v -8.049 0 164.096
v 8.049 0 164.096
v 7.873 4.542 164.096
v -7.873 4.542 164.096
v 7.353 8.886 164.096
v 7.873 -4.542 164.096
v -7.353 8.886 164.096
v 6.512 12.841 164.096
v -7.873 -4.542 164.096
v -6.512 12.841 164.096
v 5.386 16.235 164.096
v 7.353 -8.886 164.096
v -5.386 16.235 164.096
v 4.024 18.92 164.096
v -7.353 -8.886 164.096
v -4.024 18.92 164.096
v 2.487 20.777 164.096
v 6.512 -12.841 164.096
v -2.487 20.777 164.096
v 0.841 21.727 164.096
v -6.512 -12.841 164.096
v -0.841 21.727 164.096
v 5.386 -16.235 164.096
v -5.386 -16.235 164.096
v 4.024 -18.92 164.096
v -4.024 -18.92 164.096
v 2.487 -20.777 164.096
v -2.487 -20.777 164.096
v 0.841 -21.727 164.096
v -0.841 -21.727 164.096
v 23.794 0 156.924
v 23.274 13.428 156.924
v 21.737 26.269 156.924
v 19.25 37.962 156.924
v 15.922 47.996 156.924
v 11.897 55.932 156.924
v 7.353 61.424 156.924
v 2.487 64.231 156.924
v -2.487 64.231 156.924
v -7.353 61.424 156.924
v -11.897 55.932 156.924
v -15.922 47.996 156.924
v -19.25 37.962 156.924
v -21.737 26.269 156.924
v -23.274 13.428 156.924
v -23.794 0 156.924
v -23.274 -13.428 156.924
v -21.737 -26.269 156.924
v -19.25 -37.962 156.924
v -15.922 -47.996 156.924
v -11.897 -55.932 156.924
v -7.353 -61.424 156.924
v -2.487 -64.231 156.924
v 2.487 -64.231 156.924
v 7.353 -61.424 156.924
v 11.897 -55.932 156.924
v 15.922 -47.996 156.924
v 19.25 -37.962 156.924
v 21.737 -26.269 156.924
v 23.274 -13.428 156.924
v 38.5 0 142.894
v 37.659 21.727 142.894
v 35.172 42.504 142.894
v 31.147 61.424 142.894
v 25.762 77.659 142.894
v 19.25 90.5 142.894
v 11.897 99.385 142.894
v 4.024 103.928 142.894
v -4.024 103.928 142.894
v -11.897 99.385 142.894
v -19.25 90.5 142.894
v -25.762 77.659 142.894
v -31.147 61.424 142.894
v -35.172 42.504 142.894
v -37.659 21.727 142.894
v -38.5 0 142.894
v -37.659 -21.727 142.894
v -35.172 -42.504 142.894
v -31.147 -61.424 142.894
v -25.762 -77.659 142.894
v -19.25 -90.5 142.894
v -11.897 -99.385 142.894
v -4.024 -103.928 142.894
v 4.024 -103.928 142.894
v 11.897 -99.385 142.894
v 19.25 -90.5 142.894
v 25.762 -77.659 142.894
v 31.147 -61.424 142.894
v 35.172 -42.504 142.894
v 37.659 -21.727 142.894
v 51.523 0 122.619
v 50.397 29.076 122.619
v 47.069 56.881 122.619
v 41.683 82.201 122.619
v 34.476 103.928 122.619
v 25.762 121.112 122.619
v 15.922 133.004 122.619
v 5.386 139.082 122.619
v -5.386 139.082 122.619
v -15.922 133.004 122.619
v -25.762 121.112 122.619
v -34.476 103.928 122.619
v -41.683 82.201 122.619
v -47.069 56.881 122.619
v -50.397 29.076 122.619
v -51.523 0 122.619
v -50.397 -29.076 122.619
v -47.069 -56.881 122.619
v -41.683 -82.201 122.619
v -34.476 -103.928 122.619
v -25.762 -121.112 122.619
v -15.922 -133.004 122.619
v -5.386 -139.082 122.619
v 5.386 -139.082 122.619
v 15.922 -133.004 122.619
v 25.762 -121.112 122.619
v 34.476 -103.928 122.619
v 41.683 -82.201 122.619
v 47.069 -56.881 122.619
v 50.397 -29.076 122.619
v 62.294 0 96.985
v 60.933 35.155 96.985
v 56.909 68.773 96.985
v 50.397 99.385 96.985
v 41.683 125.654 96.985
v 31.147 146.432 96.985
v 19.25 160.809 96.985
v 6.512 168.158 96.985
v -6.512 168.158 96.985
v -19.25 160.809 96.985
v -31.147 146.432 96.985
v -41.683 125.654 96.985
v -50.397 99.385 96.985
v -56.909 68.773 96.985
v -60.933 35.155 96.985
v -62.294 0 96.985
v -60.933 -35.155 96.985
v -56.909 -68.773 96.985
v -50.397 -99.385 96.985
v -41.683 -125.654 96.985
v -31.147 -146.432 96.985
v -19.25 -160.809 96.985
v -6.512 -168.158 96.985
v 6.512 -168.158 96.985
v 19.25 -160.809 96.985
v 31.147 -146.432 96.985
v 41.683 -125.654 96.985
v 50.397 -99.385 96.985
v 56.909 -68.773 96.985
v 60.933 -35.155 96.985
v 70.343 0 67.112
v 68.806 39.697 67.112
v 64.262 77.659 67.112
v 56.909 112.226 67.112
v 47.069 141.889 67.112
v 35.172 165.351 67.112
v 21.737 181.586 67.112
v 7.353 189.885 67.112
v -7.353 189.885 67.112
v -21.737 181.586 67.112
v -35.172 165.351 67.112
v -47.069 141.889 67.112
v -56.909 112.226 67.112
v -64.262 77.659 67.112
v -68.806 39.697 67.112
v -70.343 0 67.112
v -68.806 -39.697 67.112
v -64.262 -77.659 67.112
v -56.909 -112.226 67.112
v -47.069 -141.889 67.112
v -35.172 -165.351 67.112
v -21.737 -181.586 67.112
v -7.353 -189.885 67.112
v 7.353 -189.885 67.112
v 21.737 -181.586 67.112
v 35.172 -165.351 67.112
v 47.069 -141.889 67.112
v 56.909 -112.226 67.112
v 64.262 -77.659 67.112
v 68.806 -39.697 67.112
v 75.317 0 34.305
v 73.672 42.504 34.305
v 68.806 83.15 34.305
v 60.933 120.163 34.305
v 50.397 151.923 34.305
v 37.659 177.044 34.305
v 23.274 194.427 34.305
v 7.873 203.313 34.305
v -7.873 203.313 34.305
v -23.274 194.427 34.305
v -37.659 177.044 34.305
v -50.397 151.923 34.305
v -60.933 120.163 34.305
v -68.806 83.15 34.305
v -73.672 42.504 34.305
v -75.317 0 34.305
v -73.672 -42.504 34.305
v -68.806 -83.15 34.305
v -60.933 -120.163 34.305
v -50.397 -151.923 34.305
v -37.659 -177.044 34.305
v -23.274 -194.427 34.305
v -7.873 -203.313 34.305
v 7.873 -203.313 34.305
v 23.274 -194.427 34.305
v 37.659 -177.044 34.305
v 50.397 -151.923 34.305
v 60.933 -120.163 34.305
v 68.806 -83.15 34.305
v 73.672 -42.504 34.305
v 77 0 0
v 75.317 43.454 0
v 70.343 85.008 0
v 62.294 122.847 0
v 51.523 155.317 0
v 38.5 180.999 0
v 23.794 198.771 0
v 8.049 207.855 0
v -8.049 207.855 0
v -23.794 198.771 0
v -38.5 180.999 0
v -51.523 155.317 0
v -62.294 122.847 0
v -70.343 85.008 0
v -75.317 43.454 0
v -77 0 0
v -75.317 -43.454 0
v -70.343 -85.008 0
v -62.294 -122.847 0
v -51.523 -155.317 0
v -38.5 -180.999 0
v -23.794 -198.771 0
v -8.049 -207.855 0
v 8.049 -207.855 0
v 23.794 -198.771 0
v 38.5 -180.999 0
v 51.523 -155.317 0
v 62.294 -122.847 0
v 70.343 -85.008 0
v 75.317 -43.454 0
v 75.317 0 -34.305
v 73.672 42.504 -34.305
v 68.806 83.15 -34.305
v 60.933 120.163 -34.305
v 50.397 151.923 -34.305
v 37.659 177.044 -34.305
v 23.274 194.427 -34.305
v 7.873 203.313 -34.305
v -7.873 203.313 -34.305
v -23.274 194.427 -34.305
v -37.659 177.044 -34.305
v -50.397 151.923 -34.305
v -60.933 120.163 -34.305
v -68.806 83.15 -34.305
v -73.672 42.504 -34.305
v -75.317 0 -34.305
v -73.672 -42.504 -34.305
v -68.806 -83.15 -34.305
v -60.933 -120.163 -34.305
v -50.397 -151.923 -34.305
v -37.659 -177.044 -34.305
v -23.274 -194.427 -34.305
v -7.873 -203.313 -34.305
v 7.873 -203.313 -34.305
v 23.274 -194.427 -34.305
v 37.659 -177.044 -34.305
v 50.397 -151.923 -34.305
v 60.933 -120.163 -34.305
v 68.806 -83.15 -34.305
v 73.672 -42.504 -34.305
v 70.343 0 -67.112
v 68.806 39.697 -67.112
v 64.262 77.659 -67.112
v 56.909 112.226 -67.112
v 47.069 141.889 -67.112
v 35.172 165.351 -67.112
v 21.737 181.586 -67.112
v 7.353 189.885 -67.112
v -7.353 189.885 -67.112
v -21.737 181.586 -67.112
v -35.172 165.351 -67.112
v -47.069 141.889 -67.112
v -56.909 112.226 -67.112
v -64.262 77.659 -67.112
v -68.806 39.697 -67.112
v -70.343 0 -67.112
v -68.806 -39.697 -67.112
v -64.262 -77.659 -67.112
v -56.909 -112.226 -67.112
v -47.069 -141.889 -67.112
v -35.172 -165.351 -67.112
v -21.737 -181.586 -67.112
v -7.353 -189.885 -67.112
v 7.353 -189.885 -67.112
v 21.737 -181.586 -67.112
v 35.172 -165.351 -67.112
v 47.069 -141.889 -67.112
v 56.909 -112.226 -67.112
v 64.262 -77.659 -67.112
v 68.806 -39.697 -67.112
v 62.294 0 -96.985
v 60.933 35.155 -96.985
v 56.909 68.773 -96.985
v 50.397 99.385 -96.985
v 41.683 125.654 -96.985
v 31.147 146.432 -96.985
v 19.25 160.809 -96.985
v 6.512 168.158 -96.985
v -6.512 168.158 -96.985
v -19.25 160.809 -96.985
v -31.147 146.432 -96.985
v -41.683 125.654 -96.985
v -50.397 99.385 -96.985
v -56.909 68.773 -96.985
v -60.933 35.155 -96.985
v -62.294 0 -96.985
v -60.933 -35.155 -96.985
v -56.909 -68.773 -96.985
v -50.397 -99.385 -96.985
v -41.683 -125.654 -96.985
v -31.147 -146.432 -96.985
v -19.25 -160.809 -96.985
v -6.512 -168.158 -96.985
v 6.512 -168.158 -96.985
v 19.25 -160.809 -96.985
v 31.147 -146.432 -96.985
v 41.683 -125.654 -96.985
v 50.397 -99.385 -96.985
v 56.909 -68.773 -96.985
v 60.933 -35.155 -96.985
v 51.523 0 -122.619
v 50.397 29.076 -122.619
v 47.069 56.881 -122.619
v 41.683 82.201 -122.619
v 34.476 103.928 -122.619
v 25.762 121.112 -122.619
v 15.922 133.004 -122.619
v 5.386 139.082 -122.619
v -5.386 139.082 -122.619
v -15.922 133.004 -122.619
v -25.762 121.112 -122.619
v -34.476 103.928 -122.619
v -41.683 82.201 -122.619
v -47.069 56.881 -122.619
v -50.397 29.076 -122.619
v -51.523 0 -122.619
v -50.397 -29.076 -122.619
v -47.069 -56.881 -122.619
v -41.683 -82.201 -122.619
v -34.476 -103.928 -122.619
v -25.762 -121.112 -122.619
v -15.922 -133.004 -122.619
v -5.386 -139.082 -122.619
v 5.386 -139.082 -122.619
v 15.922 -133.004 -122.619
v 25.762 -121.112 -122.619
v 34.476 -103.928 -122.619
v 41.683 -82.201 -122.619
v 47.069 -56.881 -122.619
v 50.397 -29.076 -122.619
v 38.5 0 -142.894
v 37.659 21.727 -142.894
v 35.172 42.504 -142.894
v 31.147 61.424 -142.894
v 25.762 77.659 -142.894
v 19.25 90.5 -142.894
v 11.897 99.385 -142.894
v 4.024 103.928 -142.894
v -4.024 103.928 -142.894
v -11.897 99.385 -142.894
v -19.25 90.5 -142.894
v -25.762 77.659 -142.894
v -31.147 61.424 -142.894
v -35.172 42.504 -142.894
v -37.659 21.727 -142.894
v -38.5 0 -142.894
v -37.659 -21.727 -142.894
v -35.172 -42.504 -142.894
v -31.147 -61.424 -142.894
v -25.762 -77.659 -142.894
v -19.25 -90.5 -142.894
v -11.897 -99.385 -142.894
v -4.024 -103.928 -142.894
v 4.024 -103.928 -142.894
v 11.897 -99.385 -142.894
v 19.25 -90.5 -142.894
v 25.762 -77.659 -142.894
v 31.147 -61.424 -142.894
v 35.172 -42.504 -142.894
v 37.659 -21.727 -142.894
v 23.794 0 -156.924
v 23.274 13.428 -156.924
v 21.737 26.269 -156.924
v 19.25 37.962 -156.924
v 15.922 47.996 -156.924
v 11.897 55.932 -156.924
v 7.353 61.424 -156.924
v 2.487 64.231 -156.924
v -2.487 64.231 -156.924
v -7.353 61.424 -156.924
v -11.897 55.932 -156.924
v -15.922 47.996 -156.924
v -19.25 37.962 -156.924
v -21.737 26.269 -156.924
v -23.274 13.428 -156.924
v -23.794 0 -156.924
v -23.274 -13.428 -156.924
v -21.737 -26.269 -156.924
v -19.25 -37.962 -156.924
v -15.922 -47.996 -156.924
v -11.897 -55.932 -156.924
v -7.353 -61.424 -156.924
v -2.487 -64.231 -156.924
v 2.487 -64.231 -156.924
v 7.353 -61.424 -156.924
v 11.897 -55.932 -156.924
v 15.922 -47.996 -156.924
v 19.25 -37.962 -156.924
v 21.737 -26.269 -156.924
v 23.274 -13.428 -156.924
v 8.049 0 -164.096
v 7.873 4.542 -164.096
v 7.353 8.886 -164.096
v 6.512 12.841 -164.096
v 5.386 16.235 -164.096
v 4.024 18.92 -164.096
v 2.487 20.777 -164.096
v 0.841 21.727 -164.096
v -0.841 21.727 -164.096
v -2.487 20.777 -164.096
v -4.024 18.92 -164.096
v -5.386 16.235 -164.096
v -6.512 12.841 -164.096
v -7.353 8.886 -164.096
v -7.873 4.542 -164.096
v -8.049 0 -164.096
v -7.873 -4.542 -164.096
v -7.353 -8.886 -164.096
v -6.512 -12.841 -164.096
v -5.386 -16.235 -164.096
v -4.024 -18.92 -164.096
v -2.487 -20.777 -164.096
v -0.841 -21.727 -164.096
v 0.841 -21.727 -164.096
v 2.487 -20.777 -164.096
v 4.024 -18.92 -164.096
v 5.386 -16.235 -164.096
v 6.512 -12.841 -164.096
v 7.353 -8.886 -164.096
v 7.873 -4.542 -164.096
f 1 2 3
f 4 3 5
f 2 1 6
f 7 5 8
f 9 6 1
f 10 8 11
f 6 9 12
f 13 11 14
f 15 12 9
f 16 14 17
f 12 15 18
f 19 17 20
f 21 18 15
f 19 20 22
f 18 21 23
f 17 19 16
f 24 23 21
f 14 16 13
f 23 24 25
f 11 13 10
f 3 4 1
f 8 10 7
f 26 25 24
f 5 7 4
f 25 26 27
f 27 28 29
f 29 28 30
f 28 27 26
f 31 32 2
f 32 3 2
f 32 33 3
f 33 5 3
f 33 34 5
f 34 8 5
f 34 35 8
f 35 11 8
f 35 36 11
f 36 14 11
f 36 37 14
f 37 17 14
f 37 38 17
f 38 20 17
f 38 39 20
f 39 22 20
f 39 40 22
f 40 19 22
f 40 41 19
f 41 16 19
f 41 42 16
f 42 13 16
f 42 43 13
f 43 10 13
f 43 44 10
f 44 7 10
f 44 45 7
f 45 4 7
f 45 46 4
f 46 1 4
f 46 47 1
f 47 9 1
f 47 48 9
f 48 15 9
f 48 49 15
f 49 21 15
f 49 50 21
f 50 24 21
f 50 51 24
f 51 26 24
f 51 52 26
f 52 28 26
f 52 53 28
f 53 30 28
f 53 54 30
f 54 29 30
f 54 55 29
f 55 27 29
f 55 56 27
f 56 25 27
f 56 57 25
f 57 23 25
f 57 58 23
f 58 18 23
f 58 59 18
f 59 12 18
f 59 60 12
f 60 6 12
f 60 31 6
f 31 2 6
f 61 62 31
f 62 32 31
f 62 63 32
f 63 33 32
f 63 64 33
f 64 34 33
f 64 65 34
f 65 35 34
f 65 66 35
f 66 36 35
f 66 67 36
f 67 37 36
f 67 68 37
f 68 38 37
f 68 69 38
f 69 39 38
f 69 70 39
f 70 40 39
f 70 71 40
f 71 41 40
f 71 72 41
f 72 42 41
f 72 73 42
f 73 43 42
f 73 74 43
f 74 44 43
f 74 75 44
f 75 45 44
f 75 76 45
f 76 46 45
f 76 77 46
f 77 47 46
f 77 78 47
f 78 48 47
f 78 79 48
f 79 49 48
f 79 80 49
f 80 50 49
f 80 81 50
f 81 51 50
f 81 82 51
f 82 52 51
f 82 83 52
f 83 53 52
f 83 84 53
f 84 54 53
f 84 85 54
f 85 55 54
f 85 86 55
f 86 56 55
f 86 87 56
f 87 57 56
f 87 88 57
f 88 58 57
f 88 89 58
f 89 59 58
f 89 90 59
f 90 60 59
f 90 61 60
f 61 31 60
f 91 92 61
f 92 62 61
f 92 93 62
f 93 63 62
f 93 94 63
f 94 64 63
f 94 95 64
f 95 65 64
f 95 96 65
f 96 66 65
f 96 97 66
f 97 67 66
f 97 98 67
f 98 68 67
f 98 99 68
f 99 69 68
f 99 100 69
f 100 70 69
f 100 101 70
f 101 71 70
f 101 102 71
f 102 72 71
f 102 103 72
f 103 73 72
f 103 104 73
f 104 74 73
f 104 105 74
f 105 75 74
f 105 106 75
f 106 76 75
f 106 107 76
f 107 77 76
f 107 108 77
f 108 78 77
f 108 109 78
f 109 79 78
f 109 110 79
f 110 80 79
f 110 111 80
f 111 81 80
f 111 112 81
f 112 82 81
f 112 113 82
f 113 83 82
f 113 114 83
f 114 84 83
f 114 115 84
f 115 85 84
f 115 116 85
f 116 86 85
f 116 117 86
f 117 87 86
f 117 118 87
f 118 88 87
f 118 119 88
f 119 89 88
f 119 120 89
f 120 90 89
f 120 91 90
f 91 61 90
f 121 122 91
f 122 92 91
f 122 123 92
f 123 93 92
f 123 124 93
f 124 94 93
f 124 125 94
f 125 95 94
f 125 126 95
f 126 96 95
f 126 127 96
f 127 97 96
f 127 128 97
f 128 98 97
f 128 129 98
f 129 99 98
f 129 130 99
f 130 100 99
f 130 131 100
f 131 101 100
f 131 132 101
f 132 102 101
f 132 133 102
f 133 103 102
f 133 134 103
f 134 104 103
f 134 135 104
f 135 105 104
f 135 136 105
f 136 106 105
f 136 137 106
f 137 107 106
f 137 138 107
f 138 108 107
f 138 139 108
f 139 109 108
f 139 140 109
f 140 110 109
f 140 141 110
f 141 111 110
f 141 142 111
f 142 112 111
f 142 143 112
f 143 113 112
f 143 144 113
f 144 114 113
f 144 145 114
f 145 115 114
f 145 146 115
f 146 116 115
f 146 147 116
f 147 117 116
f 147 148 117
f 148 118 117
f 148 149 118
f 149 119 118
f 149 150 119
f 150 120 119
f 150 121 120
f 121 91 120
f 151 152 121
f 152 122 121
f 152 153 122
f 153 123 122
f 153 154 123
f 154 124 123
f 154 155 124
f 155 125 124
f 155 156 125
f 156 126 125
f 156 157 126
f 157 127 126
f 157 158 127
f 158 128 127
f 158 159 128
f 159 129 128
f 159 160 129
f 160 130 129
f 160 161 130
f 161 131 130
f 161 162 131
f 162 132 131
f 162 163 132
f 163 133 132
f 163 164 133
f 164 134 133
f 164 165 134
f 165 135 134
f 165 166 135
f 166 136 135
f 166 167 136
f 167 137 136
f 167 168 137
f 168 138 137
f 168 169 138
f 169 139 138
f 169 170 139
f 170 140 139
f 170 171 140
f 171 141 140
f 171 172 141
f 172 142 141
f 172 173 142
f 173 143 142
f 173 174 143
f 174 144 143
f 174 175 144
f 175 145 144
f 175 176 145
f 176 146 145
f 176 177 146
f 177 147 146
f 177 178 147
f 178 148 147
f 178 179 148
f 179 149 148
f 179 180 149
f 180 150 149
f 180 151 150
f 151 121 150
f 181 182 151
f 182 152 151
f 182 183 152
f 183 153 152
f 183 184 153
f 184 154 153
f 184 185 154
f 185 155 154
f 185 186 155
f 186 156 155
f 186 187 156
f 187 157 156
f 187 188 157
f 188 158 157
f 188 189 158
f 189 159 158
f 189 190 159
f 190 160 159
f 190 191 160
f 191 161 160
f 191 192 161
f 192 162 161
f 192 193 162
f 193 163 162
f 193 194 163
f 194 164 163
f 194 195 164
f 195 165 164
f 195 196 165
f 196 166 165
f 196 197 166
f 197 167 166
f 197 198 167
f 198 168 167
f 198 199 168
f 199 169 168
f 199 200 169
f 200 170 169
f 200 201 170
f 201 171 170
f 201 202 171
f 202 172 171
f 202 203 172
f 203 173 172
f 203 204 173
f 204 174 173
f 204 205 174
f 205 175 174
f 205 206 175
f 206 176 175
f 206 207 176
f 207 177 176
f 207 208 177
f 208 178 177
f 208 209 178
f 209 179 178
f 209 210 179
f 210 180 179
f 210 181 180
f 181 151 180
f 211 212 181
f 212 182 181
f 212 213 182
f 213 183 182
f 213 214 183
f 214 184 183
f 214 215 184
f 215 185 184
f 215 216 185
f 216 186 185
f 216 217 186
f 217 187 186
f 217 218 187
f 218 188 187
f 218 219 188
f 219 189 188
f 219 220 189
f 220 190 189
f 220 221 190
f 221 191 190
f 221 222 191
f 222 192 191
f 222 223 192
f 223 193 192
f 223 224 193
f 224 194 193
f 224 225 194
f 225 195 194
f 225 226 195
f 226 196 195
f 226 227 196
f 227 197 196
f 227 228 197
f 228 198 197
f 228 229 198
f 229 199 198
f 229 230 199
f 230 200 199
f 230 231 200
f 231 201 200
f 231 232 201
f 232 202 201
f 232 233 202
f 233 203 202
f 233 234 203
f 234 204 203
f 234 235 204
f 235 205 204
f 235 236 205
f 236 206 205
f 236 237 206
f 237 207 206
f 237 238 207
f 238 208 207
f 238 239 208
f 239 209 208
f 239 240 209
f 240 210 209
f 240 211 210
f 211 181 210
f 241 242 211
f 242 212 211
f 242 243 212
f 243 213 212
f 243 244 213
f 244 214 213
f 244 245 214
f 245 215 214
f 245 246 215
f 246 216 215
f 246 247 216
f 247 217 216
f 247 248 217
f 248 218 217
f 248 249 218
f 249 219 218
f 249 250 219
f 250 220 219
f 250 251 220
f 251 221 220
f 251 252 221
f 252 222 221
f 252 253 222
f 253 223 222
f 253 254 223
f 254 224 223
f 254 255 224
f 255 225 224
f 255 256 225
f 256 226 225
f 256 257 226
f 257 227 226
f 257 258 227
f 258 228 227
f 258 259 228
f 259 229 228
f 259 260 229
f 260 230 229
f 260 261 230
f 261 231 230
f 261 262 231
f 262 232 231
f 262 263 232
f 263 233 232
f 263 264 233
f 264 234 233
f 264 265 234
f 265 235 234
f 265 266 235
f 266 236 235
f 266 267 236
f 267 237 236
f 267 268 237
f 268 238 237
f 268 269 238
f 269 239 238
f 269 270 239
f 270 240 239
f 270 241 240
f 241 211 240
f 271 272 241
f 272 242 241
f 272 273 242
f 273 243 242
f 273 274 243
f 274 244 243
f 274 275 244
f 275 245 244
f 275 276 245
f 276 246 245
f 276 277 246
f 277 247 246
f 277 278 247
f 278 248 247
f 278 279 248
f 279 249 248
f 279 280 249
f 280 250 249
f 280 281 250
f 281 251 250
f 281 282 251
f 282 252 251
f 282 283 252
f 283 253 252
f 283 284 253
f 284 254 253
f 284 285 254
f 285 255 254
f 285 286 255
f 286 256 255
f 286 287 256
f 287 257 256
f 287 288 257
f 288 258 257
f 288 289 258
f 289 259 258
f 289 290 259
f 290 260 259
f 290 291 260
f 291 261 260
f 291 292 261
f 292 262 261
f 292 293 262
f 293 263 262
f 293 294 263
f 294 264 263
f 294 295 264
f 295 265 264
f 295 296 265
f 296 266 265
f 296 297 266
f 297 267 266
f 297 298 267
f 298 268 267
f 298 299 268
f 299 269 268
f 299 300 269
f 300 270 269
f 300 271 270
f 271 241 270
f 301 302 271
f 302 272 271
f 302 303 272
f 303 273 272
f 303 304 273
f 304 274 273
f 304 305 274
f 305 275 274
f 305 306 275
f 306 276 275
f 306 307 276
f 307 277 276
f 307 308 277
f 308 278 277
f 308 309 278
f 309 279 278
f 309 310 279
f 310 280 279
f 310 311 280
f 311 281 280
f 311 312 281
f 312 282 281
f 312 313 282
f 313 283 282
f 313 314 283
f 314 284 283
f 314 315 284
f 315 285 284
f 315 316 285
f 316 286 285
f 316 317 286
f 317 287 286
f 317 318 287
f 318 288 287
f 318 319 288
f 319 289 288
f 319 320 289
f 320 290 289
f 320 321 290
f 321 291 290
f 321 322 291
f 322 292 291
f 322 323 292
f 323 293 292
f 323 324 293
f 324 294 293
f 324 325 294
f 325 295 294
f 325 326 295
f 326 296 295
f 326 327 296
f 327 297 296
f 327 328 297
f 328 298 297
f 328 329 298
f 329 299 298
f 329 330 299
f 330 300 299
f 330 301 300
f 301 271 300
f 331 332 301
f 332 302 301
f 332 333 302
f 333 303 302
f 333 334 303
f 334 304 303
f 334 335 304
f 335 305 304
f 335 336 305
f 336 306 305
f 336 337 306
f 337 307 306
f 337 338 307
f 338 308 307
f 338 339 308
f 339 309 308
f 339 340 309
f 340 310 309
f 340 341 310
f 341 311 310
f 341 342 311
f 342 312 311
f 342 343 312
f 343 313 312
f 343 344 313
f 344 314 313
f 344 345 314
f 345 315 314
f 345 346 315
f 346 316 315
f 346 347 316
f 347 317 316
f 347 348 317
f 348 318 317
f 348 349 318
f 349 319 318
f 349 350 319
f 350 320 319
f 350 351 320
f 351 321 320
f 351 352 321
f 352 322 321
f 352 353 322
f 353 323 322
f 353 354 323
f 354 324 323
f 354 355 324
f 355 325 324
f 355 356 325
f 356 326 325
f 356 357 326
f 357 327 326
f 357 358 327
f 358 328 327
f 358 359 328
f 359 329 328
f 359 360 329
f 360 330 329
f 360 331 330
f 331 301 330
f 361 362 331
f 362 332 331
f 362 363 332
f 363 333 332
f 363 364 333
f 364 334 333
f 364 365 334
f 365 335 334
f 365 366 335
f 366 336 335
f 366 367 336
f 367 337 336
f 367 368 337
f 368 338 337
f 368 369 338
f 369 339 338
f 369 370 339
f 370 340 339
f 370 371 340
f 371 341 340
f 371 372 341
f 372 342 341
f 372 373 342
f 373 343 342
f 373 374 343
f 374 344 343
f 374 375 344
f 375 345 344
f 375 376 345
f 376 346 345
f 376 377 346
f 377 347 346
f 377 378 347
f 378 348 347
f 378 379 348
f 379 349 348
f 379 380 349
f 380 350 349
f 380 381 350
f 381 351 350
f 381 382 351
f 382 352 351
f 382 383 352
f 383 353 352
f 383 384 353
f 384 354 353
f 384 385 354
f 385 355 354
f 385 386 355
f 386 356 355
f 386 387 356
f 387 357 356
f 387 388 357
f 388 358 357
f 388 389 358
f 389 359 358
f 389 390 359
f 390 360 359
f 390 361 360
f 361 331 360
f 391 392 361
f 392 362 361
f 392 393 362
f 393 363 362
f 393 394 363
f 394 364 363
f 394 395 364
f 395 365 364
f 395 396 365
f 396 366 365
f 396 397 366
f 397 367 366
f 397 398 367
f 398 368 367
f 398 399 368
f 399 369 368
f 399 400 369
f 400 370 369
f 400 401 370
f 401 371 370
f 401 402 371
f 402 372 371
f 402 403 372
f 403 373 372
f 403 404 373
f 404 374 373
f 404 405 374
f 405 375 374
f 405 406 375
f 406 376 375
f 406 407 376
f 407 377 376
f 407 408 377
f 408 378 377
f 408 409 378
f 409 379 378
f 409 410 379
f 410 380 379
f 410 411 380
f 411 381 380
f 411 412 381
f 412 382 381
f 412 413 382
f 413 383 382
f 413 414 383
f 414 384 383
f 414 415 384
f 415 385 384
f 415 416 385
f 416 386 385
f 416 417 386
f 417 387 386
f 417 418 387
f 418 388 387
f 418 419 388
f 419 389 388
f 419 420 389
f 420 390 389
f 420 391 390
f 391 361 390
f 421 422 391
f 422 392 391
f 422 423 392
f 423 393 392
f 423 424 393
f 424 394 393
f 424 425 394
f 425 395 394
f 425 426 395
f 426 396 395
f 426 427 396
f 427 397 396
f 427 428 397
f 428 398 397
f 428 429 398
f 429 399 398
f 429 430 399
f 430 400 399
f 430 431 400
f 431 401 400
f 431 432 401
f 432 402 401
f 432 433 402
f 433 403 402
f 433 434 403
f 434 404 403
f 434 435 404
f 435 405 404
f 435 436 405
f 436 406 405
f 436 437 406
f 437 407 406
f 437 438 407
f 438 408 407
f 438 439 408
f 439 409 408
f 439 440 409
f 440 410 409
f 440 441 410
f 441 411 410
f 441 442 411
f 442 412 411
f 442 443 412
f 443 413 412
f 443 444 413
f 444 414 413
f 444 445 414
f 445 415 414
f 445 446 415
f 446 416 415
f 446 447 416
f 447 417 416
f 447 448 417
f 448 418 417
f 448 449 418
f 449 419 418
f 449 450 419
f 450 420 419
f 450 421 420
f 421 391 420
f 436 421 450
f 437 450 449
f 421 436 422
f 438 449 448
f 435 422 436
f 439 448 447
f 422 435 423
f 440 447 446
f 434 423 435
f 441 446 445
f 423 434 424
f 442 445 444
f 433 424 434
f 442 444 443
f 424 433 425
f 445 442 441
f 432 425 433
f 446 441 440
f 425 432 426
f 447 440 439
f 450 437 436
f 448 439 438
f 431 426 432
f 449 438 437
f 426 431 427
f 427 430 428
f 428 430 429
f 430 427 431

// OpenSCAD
// Generated by SolidPython 1.0.1 on 2020-07-29 00:46:48


scale(v = [7, 19, 15]) {
	sphere(r = 11);
}
/***********************************************
*********      SolidPython code:      **********
************************************************
 
# import packages: SolidPython
from solid import *
from solid.utils import *
from itertools import chain, combinations, permutations


class Resize:

    def __init__(self, scad_file):
        self.scad_file = scad_file
        #self.scad_file = import_scad(scad_file)
        # cone/cylinder param:
        self.r1 = 0
        self.r2 = 0
        self.h = 0
        # rectangular prism param:
        self.w = 0
        self.l = 0
        # ellipse param:
        self.r = 0

    # import OpenScad code (file name corresponds to shape)


    # classify shape + parameters
    def assign(self, param1, param2, param3):
        if self.scad_file == 'cone.scad':
            self.r1 = param1
            self.r2 = param2
            self.h = param3
        elif self.scad_file == 'cylinder.scad':
            self.r1 = param1
            self.r2 = param2
            self.h = param3
        elif self.scad_file == 'rectangularPrism.scad':
            self.h = param1
            self.l = param2
            self.w = param3
        else:
            self.r = param1
            self.h = param2

    # resize parameters
    def iterate(self):
        x = range(3, 20, 2)
        i = 1
        if self.scad_file == 'cone.scad':
            tempList = list(permutations(x, 2))
            for temp in tempList:
                param1 = temp[0]
                param2 = temp[1]
                filepath = 'produced_scad_files/' + 'cone' + str(param1) + '_' + str(param2) + '_' + '.scad'
                scad_render_to_file(cylinder(h=param1, r1=param2, r2=0), filepath)

        elif self.scad_file == 'cylinder.scad':
            tempList = list(permutations(x, 3))
            for temp in tempList:
                param1 = temp[0]
                param2 = temp[1]
                filepath = 'produced_scad_files/' + 'cylinder' + str(param1) + '_' + str(param2) + '_' + '.scad'
                scad_render_to_file(cylinder(h=param1, r1=param2, r2=param2), filepath)

        elif self.scad_file == 'rectangularPrism.scad':
            tempList = list(permutations(x, 3))
            for temp in tempList:
                param1 = temp[0]
                param2 = temp[1]
                param3 = temp[2]
                filepath = 'produced_scad_files/' + 'rectangularPrism' + str(param1) + '_' + str(param2) + '_' + str(
                    param3) + '.scad'
                scad_render_to_file(cube(size=(param1, param2, param3)), filepath)

        elif self.scad_file == 'ellipse.scad':
            tempList = list(permutations(x, 4))
            for temp in tempList:
                param1 = temp[0]
                param2 = temp[1]
                param3 = temp[2]
                param4 = temp[3]
                filepath = 'produced_scad_files/' + 'ellipse' + str(param1) + '_' + str(param2) + '_' + str(param3) + '_' + str(param4) + '.scad'
                scad_render_to_file(scale([param1, param2, param3])(sphere(r=param4)), filepath)

    def render_to_scadfile(self):
        scad_render_to_file(scad, 'example.scad') 
 
************************************************/
